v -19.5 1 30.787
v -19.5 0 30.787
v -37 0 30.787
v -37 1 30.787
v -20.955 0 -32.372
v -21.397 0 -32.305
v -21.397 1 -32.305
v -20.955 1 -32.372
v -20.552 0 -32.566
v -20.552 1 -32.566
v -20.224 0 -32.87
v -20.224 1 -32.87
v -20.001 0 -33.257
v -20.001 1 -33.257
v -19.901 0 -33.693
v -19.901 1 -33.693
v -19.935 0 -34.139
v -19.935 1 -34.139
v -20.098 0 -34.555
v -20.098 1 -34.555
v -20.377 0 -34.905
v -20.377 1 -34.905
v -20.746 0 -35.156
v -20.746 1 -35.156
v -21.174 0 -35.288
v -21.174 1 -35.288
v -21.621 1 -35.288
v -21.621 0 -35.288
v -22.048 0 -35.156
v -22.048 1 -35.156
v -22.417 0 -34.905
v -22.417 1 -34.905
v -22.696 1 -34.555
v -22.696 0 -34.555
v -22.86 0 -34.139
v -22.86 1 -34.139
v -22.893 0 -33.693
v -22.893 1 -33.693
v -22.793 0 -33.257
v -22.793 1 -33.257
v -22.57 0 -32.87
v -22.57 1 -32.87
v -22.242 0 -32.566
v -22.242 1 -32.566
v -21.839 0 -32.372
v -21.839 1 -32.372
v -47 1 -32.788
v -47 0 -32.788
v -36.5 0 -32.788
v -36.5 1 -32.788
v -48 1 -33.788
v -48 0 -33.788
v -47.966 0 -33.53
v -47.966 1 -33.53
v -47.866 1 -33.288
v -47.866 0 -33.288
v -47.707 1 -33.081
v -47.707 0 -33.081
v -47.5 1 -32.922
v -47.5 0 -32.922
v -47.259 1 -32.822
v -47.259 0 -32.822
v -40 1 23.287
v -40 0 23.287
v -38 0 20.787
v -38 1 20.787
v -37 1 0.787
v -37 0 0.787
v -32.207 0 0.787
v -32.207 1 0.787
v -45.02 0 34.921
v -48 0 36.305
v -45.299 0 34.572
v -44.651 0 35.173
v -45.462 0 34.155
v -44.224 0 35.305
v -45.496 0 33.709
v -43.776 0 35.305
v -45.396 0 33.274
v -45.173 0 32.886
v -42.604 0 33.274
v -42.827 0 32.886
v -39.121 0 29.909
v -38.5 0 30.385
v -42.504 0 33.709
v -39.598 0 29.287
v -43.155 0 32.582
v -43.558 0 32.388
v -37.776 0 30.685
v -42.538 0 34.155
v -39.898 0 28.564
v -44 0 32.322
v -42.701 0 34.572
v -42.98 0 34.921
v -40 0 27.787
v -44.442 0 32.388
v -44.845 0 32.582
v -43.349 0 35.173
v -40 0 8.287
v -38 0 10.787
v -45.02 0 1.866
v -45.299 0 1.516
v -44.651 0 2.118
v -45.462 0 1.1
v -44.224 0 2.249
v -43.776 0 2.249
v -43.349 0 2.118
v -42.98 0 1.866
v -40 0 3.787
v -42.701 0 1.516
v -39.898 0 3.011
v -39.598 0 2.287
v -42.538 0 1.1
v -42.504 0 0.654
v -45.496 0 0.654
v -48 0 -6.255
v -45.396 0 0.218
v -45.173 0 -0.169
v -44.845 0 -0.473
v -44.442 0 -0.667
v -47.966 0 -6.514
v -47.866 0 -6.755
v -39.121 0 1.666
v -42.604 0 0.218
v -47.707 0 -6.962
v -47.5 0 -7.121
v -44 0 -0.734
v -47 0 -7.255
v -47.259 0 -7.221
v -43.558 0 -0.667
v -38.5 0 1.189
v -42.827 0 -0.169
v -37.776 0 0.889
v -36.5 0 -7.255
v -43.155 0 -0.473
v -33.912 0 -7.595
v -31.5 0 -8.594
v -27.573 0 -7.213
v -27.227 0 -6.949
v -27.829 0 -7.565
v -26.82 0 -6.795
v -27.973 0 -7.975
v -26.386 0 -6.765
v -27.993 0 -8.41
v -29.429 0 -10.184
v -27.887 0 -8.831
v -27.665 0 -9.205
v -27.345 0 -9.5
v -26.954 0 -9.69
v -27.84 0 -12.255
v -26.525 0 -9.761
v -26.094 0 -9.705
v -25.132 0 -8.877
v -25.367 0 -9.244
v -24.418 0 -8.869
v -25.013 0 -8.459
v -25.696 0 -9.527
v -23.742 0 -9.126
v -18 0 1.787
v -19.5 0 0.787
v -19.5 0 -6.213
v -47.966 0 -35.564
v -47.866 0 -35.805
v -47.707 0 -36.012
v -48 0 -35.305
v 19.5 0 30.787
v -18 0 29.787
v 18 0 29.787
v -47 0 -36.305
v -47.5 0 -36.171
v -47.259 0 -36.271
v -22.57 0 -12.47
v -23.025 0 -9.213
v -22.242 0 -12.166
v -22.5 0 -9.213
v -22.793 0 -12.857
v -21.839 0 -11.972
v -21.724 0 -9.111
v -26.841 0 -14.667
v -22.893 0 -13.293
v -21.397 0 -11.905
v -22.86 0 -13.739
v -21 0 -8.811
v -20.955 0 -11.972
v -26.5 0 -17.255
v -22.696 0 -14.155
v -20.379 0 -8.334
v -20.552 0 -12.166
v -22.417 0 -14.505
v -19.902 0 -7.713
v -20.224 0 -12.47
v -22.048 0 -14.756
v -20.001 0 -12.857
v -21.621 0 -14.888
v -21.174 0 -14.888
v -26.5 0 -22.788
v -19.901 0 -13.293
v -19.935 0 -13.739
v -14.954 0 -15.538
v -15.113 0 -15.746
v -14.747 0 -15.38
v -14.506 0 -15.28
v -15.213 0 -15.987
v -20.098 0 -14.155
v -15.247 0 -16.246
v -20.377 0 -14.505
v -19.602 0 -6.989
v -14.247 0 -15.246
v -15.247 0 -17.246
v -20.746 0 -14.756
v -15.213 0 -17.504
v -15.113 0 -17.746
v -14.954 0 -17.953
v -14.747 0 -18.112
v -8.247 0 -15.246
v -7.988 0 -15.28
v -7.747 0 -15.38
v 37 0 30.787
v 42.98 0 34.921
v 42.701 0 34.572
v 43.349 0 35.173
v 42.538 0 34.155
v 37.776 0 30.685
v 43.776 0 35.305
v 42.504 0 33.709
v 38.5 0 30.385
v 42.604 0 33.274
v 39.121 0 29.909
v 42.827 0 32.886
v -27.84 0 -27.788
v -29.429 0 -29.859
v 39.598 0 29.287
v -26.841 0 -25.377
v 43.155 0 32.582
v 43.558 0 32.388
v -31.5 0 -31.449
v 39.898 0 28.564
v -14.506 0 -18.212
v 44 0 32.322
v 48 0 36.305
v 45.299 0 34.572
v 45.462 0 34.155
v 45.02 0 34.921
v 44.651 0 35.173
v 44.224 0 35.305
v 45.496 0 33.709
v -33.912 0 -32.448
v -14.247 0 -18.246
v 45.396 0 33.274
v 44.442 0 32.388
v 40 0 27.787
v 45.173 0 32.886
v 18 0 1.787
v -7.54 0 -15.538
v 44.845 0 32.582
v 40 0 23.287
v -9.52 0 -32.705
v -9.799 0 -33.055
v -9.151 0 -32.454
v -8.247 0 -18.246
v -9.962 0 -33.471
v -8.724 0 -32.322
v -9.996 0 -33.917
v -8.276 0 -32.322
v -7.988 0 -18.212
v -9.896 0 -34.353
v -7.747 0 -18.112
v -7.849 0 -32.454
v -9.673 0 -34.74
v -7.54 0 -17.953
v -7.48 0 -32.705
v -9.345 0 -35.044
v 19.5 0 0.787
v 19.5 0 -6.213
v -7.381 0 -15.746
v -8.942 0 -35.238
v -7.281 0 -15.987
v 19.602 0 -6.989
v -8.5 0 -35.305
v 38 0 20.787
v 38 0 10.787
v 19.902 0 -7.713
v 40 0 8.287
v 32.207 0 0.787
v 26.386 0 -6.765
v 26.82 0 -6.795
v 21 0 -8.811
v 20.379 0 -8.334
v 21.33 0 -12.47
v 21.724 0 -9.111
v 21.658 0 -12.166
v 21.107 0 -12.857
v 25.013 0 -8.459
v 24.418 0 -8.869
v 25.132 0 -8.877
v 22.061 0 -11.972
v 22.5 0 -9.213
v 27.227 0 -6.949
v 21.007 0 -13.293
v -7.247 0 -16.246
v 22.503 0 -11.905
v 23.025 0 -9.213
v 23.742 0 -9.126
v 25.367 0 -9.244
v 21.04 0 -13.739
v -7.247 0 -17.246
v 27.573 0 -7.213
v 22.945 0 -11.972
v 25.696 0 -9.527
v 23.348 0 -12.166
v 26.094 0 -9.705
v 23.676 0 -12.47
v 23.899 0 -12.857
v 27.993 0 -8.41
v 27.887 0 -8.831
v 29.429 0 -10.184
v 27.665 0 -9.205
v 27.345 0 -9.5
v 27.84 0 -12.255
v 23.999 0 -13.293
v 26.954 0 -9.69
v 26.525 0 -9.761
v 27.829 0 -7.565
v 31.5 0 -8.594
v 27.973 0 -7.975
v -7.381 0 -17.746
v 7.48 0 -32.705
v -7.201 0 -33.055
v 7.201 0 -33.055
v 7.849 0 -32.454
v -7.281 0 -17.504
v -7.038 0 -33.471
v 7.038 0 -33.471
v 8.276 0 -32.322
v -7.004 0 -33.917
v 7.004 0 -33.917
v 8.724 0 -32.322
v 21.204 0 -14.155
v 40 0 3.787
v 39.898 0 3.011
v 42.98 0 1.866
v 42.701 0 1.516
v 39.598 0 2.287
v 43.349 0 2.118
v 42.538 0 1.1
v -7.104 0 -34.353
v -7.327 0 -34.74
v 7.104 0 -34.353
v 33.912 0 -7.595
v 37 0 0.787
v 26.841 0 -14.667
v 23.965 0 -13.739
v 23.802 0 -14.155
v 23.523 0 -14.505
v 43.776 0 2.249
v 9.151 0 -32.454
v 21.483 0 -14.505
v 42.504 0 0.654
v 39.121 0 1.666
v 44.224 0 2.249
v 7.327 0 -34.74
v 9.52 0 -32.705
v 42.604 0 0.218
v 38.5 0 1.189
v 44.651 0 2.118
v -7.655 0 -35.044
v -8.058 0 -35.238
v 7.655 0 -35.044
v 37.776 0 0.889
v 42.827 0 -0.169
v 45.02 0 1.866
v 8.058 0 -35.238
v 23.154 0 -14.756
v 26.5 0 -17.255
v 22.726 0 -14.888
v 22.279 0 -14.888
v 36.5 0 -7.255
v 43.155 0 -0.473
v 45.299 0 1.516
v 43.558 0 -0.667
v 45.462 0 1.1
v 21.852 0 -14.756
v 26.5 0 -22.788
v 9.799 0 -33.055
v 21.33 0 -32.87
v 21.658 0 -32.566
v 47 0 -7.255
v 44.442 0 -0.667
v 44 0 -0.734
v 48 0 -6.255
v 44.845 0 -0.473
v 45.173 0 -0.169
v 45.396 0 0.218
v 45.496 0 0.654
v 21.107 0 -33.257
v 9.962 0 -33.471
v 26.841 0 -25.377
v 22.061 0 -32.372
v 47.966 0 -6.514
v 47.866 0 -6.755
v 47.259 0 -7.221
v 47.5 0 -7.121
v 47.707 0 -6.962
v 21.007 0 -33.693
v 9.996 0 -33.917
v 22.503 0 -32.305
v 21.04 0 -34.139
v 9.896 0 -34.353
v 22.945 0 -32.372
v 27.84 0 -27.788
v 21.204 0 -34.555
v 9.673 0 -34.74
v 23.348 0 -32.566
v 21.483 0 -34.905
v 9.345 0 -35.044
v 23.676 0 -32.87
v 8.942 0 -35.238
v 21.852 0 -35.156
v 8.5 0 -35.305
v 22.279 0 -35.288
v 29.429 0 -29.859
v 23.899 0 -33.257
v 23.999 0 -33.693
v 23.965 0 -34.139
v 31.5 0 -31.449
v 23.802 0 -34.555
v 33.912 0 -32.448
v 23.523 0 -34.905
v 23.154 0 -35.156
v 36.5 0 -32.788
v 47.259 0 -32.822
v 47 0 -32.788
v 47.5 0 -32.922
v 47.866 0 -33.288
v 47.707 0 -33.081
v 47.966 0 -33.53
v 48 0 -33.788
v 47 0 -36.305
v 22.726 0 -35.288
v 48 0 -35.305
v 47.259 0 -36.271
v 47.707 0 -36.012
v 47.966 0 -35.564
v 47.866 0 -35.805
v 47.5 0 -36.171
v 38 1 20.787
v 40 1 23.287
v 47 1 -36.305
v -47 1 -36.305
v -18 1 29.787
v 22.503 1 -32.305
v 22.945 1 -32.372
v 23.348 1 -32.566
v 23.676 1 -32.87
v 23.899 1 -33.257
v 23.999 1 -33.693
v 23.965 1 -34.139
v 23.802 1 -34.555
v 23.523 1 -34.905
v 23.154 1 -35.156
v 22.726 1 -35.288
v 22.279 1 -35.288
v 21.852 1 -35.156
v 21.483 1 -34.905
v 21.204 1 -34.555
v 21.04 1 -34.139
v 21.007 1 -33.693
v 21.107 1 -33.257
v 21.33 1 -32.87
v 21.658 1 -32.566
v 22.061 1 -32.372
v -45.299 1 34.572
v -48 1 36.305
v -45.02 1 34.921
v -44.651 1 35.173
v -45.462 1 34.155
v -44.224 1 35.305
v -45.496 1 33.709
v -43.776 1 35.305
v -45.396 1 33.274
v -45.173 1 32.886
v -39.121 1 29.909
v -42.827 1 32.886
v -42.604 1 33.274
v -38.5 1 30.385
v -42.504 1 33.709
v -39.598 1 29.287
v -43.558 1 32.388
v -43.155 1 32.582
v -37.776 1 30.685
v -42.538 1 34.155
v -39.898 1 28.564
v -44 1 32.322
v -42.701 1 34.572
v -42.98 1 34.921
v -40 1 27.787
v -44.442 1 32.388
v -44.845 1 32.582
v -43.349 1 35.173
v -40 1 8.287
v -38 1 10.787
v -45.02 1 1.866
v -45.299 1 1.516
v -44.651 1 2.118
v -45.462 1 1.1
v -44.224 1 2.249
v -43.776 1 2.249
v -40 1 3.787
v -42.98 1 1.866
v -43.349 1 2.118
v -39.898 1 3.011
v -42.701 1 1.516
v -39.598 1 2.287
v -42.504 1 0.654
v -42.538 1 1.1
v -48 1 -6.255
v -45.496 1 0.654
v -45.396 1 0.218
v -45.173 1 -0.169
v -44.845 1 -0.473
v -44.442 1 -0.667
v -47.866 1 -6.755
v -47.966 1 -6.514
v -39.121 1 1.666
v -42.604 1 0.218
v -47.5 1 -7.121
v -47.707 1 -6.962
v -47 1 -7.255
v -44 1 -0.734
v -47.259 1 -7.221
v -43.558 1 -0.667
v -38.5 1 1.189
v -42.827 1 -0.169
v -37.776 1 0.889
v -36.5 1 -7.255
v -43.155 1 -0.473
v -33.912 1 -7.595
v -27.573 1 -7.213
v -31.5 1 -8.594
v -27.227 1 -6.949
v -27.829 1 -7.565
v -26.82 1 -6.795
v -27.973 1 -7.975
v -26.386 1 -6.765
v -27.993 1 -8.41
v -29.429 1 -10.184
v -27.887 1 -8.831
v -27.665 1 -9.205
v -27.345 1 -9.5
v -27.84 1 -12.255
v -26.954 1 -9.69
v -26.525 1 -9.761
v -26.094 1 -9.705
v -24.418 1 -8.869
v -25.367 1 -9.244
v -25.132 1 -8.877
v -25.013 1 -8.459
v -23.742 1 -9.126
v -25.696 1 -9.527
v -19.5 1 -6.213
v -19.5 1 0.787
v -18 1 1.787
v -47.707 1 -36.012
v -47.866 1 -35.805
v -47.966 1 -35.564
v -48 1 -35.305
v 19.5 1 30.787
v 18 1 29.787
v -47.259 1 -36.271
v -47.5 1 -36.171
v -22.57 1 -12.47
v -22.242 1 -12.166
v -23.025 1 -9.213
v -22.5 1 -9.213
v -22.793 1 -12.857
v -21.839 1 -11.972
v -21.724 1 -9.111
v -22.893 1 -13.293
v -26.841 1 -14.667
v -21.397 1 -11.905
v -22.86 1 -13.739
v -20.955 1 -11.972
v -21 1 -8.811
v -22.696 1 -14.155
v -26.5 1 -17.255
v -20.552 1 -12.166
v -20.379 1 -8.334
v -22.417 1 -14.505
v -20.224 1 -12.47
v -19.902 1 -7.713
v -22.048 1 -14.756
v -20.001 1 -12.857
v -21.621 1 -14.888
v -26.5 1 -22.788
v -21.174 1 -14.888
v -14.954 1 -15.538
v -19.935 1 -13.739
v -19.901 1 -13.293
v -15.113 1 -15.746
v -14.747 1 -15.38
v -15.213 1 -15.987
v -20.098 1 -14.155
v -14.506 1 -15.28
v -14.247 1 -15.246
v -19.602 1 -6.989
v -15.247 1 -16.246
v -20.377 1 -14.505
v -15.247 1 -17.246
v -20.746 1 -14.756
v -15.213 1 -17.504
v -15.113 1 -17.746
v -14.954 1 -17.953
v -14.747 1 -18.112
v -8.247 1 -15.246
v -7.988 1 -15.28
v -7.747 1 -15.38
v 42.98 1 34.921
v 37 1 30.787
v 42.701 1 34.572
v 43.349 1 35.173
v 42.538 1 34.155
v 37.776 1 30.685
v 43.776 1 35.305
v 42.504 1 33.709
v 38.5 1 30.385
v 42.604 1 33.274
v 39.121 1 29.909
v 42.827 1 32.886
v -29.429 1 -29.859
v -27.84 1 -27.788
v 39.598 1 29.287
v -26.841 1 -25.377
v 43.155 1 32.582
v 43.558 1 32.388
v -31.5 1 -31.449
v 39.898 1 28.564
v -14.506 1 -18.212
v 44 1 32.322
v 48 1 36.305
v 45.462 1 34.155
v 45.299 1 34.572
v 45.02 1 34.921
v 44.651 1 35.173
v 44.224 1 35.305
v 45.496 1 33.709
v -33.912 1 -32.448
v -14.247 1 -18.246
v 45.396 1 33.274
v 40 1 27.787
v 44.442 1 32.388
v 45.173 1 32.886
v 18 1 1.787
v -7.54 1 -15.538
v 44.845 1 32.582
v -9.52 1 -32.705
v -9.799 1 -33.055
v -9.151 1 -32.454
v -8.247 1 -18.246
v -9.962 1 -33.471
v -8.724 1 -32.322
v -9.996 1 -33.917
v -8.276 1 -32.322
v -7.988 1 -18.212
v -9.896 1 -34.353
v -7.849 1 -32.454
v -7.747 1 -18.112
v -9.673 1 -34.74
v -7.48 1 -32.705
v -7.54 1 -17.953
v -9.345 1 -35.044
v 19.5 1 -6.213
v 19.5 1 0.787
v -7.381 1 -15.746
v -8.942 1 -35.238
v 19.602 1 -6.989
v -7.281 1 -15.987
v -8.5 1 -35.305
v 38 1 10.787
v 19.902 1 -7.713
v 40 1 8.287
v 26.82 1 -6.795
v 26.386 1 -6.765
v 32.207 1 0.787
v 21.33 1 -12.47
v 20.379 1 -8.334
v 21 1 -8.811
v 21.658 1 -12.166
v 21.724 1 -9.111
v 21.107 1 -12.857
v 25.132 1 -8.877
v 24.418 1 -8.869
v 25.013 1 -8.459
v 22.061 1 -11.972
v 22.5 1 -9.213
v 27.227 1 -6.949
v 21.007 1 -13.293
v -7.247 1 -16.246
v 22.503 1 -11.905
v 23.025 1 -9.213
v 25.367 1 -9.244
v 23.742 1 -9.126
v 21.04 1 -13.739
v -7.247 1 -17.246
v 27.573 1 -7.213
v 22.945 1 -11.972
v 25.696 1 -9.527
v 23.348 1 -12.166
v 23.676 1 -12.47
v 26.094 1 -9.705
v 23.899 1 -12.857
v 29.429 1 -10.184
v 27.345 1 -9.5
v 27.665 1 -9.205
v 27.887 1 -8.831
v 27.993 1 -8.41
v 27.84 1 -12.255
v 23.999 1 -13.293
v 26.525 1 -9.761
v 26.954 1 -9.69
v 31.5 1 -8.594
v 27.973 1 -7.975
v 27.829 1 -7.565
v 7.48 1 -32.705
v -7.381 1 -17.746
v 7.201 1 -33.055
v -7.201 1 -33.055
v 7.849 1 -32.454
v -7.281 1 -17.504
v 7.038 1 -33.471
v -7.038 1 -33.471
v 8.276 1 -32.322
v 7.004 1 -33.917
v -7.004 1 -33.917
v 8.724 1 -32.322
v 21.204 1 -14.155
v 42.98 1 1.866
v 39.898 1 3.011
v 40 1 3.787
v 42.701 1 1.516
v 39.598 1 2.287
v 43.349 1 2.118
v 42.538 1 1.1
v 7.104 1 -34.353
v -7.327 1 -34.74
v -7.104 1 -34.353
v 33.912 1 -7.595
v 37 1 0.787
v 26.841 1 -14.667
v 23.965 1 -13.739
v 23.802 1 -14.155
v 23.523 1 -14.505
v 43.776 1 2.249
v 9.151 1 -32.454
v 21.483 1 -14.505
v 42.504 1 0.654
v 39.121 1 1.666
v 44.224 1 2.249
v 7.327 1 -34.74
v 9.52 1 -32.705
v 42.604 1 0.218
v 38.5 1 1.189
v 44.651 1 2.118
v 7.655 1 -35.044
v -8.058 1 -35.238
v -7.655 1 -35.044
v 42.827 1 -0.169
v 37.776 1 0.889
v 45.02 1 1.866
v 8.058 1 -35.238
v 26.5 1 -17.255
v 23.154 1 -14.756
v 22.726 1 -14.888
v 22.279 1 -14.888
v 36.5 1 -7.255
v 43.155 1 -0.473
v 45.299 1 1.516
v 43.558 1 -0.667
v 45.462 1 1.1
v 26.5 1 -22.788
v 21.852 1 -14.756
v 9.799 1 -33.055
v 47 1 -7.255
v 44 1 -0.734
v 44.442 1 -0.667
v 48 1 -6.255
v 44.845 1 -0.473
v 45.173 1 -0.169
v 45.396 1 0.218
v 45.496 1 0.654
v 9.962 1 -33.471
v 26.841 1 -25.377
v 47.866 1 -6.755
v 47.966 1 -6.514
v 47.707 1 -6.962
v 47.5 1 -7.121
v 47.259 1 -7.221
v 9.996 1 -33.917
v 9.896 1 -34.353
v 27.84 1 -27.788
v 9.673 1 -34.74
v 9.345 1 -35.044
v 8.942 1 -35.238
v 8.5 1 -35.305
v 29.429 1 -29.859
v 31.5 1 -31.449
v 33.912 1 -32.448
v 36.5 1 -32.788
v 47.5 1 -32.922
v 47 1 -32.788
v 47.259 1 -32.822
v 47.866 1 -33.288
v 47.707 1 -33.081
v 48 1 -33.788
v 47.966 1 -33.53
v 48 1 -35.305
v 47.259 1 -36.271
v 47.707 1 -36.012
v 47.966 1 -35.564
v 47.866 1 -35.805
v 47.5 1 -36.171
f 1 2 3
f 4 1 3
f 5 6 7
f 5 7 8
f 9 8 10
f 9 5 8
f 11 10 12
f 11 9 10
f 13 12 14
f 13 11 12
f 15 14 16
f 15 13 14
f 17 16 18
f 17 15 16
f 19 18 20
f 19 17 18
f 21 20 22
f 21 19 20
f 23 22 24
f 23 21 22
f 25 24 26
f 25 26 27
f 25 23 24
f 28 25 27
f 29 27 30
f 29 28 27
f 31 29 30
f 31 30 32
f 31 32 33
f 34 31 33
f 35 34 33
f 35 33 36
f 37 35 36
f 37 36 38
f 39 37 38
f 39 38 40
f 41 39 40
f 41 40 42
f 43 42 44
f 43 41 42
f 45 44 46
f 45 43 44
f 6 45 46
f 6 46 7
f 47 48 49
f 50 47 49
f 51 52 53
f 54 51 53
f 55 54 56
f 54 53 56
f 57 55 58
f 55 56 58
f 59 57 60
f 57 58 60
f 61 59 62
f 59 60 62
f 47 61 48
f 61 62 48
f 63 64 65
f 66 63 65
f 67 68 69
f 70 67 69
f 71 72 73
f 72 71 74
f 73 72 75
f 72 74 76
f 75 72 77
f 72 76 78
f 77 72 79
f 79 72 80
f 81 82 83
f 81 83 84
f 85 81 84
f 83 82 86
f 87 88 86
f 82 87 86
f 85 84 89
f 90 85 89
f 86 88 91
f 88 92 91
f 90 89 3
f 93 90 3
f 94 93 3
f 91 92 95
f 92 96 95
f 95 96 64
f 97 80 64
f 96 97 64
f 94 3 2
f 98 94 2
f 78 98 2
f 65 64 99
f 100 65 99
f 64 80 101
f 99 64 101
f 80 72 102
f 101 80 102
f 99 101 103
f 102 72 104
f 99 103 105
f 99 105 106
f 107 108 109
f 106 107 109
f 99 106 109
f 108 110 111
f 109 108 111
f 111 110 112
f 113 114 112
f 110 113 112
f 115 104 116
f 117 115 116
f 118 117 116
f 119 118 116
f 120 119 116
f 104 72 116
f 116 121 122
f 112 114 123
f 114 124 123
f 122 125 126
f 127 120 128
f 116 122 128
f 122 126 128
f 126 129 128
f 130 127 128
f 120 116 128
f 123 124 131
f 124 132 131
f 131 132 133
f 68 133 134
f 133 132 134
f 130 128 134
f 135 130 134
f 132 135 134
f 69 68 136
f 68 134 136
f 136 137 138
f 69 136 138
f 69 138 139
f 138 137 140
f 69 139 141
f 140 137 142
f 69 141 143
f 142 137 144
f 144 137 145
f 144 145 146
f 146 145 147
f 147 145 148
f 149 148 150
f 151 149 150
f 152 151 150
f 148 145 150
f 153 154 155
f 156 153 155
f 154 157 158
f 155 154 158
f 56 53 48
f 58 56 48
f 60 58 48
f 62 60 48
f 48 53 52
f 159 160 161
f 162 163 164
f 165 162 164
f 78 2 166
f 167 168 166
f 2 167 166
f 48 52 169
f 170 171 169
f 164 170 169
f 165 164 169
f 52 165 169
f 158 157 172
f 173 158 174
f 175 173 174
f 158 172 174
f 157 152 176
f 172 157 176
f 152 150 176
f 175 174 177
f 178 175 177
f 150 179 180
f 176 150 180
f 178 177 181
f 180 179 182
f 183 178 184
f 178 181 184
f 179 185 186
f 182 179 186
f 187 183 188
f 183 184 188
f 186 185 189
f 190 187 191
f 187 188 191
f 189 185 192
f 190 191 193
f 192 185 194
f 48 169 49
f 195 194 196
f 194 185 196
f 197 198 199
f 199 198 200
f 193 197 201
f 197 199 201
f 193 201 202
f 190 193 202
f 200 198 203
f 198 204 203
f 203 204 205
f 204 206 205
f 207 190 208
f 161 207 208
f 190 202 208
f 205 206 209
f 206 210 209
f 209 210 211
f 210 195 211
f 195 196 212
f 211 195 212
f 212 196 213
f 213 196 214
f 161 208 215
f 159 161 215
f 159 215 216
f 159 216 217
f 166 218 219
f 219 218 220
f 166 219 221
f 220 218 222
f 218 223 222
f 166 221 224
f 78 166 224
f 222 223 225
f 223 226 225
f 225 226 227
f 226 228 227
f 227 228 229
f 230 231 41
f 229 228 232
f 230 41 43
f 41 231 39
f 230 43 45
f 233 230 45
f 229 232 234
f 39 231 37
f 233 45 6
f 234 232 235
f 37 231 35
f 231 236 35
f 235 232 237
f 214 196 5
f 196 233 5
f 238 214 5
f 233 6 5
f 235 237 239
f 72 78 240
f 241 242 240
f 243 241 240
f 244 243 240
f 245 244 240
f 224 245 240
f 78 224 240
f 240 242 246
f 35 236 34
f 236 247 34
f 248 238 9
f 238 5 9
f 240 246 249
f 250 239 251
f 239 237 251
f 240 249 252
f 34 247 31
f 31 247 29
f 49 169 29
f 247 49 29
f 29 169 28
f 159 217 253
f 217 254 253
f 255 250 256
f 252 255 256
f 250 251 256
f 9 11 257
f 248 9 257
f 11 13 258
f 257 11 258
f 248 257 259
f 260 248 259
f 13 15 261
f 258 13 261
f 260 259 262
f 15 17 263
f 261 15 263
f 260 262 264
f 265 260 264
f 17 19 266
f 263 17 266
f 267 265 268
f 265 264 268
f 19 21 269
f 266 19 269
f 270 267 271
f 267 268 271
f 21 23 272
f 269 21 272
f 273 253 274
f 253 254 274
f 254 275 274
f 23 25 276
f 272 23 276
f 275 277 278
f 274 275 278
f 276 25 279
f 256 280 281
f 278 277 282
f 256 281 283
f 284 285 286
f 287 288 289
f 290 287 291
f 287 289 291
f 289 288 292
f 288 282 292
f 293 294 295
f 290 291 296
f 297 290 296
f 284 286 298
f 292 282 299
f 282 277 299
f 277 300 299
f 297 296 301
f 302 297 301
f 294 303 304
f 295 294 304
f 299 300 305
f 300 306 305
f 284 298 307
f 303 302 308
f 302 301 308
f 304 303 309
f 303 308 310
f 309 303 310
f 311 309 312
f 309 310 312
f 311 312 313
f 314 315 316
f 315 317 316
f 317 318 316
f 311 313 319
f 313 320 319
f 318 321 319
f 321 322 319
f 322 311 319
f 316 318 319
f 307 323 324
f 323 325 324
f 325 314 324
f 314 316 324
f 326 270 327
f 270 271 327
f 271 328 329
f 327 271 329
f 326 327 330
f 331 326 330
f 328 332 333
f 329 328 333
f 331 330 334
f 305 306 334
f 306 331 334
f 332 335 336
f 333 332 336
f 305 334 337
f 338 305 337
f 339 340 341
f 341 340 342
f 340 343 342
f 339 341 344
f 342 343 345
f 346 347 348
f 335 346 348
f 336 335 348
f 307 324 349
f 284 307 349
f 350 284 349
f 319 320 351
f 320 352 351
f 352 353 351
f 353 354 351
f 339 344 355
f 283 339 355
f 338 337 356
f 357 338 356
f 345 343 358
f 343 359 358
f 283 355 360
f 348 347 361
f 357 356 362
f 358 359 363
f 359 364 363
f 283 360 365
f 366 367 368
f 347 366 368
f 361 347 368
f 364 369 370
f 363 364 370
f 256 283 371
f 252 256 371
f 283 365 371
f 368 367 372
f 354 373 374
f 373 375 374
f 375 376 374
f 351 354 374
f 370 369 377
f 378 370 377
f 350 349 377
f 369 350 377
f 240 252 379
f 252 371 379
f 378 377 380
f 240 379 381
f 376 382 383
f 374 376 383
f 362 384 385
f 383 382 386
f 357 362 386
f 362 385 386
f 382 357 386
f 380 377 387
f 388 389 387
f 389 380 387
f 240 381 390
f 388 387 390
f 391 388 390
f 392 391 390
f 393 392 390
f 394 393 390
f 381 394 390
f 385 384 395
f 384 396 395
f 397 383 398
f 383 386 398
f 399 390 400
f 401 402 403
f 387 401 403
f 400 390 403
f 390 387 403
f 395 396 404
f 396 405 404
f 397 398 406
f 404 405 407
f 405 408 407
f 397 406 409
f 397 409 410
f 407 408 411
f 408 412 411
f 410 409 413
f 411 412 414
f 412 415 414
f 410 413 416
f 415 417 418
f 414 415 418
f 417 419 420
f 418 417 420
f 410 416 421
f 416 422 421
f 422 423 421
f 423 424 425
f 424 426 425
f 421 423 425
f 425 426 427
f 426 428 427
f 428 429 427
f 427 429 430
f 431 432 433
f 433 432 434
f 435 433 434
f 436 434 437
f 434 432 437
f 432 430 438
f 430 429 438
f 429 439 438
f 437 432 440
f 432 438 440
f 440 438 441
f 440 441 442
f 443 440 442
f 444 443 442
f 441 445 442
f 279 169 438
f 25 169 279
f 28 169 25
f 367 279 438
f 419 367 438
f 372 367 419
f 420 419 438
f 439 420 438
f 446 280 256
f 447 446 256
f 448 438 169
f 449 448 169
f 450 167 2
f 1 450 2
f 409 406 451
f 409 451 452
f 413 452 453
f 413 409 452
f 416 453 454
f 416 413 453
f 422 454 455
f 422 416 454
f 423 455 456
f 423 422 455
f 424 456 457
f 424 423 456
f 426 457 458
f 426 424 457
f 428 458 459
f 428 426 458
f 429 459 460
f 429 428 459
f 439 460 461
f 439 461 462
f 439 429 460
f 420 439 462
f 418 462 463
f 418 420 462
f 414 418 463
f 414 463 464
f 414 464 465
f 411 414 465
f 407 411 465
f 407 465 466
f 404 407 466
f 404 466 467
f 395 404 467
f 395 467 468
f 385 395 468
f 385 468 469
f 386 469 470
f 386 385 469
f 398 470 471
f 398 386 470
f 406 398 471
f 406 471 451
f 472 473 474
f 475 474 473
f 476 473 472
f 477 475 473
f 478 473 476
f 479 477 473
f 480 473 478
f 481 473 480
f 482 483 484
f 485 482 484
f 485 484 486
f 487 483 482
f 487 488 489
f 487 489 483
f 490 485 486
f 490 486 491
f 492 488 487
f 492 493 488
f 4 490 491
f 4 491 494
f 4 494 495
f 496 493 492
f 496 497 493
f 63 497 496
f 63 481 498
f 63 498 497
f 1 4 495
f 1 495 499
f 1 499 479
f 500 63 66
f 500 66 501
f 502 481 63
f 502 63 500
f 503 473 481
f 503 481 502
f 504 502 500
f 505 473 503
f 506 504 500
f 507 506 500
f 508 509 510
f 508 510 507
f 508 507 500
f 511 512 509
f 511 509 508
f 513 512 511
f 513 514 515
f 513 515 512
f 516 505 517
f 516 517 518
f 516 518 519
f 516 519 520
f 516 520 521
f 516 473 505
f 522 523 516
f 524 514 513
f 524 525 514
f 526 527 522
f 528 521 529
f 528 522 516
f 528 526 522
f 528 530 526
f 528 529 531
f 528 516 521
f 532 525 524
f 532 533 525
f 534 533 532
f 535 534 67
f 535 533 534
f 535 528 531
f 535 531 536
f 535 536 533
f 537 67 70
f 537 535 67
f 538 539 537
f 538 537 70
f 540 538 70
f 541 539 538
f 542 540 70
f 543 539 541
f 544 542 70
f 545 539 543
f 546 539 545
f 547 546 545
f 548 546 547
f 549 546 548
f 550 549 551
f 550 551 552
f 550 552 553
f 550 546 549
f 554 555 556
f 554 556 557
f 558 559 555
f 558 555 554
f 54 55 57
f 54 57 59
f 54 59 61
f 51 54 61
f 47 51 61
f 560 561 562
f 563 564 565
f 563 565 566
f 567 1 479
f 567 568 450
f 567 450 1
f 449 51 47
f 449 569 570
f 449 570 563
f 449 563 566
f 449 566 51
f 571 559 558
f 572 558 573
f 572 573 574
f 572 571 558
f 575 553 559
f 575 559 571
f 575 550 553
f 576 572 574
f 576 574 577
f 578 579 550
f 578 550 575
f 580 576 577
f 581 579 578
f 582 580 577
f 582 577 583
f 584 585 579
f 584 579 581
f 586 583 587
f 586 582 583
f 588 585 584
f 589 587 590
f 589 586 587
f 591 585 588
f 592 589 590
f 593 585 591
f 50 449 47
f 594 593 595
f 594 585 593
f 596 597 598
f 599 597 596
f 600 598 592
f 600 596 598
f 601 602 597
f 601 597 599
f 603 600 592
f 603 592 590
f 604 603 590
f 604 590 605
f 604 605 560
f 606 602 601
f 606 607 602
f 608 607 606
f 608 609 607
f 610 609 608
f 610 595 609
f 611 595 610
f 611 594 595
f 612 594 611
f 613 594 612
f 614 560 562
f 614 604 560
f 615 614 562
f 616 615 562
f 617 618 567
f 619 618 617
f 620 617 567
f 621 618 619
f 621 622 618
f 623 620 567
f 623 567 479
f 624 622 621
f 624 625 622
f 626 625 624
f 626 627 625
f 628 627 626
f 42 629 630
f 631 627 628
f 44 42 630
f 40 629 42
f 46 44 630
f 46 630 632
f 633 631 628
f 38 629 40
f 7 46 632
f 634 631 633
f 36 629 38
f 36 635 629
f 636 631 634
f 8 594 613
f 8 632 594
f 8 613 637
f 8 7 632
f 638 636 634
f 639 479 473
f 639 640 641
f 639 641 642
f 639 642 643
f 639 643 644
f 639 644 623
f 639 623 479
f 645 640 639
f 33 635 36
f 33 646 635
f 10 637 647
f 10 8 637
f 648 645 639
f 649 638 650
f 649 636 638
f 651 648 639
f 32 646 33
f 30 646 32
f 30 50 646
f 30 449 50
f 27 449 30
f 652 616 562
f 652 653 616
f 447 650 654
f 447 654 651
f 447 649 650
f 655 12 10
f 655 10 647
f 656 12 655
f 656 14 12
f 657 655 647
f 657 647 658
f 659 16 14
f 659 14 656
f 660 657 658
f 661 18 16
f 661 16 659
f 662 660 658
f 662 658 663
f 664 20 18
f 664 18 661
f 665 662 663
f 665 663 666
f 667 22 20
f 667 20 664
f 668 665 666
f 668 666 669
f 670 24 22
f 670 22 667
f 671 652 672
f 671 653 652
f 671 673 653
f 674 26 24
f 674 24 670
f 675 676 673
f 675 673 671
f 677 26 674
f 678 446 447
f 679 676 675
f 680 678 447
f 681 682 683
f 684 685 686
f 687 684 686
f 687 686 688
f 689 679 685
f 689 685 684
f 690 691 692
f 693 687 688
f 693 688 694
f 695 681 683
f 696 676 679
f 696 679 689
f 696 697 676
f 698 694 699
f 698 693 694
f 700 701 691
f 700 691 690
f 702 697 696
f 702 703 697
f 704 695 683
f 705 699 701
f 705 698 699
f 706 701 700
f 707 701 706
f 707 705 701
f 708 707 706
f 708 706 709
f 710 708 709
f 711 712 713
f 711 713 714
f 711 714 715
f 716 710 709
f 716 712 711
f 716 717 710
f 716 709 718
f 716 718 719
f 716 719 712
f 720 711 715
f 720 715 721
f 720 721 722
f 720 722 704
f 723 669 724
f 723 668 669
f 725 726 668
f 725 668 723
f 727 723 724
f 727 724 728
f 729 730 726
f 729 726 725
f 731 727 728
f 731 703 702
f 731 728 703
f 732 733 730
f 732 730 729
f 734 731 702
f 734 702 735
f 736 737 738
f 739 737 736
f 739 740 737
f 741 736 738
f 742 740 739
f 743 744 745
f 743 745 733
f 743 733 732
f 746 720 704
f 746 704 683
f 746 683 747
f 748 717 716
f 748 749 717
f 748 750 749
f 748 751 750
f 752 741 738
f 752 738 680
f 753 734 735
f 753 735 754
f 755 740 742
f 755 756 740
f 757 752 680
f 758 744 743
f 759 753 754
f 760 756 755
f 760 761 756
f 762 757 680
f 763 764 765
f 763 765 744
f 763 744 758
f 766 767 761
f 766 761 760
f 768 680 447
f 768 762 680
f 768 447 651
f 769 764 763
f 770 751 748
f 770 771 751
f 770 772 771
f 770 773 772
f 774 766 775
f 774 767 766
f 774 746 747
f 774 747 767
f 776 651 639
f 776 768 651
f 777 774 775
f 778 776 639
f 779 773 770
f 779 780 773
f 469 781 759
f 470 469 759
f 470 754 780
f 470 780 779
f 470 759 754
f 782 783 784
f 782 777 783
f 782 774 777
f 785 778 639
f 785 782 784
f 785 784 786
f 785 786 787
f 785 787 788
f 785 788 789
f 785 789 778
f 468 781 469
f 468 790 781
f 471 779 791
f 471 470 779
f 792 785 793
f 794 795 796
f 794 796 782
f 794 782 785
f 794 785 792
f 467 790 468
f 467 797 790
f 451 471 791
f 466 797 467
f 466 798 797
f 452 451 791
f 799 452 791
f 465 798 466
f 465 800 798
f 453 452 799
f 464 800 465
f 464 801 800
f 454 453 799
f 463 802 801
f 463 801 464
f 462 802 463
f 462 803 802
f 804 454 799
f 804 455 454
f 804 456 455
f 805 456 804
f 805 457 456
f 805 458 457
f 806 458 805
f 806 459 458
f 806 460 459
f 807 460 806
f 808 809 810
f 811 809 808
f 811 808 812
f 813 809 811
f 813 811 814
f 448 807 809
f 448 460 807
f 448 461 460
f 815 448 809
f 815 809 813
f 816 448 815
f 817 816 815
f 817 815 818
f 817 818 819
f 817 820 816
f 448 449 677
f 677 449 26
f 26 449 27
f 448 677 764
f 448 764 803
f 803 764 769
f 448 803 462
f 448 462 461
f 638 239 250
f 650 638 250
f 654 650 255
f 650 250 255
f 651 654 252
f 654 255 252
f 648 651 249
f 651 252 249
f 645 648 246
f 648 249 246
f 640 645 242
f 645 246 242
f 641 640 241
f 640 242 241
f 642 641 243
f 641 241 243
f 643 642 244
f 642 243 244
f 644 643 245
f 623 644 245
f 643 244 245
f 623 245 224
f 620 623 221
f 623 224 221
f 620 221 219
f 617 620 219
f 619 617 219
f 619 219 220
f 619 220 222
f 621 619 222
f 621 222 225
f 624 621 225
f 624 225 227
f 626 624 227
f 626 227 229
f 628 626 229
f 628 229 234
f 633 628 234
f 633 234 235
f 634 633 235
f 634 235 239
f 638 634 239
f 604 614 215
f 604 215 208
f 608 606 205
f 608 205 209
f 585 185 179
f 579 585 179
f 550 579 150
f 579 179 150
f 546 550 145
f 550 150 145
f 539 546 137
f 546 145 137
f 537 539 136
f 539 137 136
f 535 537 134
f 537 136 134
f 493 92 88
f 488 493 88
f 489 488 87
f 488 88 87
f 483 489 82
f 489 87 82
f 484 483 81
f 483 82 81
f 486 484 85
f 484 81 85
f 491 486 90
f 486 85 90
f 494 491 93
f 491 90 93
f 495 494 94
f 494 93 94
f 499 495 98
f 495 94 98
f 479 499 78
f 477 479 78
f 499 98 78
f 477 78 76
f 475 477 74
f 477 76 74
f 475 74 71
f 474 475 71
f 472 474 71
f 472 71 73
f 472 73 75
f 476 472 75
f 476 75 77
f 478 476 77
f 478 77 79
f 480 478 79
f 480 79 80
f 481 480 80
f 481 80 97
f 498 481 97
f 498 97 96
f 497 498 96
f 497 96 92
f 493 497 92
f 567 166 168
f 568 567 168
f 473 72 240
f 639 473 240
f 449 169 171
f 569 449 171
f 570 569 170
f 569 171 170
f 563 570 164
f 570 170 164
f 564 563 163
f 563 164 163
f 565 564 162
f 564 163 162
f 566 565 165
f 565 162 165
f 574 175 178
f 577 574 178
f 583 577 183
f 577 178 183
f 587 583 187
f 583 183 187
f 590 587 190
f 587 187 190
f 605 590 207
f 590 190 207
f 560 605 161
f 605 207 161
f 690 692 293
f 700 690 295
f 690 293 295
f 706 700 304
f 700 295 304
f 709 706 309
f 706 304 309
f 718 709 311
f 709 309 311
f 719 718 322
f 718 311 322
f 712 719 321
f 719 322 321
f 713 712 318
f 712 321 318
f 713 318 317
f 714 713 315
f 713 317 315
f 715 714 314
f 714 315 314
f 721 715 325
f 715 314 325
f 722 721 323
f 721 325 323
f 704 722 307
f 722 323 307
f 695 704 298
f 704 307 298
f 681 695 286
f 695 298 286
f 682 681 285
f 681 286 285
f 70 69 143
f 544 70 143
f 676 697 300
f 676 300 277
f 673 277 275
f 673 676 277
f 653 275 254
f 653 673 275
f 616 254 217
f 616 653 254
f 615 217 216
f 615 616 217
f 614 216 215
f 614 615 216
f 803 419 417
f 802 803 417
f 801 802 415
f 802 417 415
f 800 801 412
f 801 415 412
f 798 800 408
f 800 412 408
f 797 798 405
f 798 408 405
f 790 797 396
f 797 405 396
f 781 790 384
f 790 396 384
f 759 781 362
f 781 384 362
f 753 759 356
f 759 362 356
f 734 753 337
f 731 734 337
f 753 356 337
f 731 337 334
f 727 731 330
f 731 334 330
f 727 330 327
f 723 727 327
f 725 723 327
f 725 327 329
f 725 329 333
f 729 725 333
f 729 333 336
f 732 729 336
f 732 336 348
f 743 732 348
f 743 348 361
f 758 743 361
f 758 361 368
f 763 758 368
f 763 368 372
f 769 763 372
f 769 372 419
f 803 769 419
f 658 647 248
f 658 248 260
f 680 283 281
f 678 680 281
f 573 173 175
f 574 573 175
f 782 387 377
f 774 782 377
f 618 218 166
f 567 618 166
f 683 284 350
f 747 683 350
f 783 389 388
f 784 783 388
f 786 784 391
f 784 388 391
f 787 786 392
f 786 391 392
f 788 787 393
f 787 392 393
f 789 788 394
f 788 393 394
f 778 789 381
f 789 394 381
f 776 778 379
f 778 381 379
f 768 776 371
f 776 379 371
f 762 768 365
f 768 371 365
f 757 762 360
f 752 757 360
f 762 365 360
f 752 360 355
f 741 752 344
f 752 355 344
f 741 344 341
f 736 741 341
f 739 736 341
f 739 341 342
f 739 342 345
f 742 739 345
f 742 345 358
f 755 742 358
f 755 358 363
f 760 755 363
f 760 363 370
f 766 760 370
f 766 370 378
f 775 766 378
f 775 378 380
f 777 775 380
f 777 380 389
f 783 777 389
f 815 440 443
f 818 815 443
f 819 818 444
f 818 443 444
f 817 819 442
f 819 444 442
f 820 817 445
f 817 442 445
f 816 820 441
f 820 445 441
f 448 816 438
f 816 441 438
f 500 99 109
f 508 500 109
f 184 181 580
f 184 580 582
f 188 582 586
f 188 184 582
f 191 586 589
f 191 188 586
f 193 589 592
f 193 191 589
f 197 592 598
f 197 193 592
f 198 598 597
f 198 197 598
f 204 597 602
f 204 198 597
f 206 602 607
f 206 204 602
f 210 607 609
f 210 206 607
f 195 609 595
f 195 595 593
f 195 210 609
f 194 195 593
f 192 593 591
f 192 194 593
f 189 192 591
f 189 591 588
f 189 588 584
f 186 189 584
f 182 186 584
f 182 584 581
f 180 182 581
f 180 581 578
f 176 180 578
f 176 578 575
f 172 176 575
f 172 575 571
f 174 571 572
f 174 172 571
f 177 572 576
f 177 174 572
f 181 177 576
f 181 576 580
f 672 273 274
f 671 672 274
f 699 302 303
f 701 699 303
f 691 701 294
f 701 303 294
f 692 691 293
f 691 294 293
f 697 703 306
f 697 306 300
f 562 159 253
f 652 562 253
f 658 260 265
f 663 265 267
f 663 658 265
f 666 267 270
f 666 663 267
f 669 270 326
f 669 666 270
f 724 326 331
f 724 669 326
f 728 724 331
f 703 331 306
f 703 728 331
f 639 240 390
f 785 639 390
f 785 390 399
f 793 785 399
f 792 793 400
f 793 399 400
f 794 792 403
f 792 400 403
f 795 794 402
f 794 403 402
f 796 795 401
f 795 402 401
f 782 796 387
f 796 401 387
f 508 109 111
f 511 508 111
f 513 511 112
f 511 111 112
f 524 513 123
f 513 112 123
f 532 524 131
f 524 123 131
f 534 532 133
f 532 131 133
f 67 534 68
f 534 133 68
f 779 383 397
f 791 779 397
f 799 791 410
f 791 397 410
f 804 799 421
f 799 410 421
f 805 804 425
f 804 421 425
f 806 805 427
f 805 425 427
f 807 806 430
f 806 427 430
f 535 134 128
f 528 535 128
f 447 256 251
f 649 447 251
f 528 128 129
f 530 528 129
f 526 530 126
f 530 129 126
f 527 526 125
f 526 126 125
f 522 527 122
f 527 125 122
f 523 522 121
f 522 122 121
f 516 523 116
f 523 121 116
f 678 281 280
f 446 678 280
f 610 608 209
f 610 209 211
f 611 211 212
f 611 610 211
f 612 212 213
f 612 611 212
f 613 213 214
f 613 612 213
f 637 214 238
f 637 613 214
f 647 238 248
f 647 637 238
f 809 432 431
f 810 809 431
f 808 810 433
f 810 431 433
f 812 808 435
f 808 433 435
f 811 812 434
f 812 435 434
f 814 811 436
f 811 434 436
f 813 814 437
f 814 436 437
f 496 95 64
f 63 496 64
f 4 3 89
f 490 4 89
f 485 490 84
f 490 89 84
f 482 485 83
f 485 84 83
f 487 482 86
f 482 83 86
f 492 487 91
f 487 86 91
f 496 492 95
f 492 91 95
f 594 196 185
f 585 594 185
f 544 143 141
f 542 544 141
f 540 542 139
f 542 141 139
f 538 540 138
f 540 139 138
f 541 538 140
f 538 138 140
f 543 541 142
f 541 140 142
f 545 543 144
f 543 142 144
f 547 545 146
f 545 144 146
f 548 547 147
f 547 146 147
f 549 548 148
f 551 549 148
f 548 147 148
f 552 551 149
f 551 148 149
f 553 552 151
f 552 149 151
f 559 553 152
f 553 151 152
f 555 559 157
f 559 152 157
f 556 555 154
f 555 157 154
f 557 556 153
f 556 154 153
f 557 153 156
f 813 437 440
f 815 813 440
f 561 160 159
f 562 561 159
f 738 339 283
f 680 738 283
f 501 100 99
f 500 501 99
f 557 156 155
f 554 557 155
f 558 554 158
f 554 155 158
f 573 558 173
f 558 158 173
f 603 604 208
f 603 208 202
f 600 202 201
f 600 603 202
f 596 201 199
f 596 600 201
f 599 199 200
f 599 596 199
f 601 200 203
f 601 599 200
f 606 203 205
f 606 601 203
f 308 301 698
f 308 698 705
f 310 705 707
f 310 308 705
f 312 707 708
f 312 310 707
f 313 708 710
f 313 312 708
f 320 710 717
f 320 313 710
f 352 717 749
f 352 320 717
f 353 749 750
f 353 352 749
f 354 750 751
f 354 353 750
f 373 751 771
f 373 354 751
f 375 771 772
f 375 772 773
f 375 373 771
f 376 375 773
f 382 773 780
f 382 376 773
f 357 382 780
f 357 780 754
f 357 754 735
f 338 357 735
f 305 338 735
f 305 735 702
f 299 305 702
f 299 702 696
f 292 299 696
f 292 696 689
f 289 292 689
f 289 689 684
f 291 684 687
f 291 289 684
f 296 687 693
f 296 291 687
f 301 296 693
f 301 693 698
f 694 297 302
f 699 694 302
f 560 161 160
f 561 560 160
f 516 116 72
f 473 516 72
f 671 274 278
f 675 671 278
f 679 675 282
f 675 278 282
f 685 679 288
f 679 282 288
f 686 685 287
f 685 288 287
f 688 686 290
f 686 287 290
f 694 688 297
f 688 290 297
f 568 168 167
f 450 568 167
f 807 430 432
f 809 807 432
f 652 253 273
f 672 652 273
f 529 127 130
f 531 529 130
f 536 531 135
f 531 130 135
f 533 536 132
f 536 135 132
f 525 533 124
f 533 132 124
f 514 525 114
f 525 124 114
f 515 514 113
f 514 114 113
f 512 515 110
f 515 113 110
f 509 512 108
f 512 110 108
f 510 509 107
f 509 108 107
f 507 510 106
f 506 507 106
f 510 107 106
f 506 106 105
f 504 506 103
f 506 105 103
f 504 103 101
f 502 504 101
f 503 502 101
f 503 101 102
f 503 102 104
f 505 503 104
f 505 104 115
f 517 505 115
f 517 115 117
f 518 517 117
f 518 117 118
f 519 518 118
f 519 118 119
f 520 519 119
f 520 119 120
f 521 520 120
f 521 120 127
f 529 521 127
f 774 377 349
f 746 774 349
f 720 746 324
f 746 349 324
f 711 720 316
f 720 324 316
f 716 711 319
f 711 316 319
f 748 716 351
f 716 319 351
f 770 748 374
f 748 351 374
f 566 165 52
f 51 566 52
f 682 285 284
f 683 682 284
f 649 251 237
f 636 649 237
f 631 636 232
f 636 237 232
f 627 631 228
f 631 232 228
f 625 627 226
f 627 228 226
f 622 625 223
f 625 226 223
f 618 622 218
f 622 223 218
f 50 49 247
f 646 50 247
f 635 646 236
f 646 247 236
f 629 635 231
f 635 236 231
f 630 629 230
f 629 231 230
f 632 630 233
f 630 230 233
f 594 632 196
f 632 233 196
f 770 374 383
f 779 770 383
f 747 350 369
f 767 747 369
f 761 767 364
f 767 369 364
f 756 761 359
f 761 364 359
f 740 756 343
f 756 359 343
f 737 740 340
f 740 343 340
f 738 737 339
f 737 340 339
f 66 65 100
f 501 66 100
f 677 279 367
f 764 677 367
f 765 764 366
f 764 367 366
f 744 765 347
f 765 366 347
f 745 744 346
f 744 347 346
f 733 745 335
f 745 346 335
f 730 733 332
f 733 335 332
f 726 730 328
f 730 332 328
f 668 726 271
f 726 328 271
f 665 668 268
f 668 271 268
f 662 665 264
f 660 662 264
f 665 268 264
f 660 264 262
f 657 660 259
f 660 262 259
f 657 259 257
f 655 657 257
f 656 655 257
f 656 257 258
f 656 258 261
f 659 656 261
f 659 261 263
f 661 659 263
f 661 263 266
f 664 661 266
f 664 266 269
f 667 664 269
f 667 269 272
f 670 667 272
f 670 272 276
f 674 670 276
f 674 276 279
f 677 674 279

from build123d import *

# Parameters (mm, degrees)
SKETCH_1_R          = 1.5
EXTRUDE_1_DEPTH     = 1
SKETCH_3_R          = 1.5
CUT_EXTRUDE_1_DEPTH = 61.191781662
SKETCH_4_R          = 1.5
CUT_EXTRUDE_2_DEPTH = 61.191781662
CUT_EXTRUDE_3_DEPTH = 61.191781662


with BuildPart() as part:
    # Эскиз1 → Бобышка-Вытянуть1 (new body)
    with BuildSketch(Plane(origin=(0, 0, 0), x_dir=(1, 0, 0), z_dir=(0, 1, 0))):
        with BuildLine():
            Line((-48, -36.304966321), (48, -36.304966321))
            Line((48, -36.304966321), (48, 6.254720986))
            ThreePointArc((48, 6.254720986), (47.707106781, 6.961827767), (47, 7.254720986))
            Line((47, 7.254720986), (36.5, 7.254720986))
            ThreePointArc((36.5, 7.254720986), (29.428932188, 10.183653174), (26.5, 17.254720986))
            Line((26.5, 17.254720986), (26.5, 22.788381883))
            ThreePointArc((26.5, 22.788381883), (29.428932188, 29.859449695), (36.5, 32.788381883))
            Line((36.5, 32.788381883), (47, 32.788381883))
            ThreePointArc((47, 32.788381883), (47.707106781, 33.081275101), (48, 33.788381883))
            Line((48, 33.788381883), (48, 35.304966322))
            ThreePointArc((48, 35.304966322), (47.707106781, 36.012073103), (47, 36.304966322))
            Line((47, 36.304966322), (-47, 36.304966322))
            ThreePointArc((-47, 36.304966322), (-47.707106781, 36.012073103), (-48, 35.304966322))
            Line((-48, 35.304966322), (-48, 33.788381883))
            ThreePointArc((-48, 33.788381883), (-47.707106781, 33.081275101), (-47, 32.788381883))
            Line((-47, 32.788381883), (-36.5, 32.788381883))
            ThreePointArc((-36.5, 32.788381883), (-29.428932188, 29.859449695), (-26.5, 22.788381883))
            Line((-26.5, 22.788381883), (-26.5, 17.254720986))
            ThreePointArc((-26.5, 17.254720986), (-29.428932188, 10.183653174), (-36.5, 7.254720986))
            Line((-36.5, 7.254720986), (-47, 7.254720986))
            ThreePointArc((-47, 7.254720986), (-47.707106781, 6.961827767), (-48, 6.254720986))
            Line((-48, 6.254720986), (-48, -36.304966321))
        make_face()
        with Locations(Location((-21.397134942, 13.404966321, 0), (0, 0, 270))):
            Circle(SKETCH_1_R, mode=Mode.SUBTRACT)
        with Locations(Location((-21.397134942, 33.804966321, 0), (0, 0, 270))):
            Circle(SKETCH_1_R, mode=Mode.SUBTRACT)
        with Locations(Location((22.502865058, 13.404966321, 0), (0, 0, 270))):
            Circle(SKETCH_1_R, mode=Mode.SUBTRACT)
        with Locations(Location((22.502865058, 33.804966321, 0), (0, 0, 270))):
            Circle(SKETCH_1_R, mode=Mode.SUBTRACT)
        with BuildLine():
            Line((-19.5, -0.787211353), (-18, -1.787211353))
            Line((-18, -1.787211353), (18, -1.787211353))
            Line((18, -1.787211353), (19.5, -0.787211353))
            Line((19.5, -0.787211353), (19.5, 6.212788647))
            ThreePointArc((19.5, 6.212788647), (20.378679656, 8.334108991), (22.5, 9.212788647))
            Line((22.5, 9.212788647), (23.024503903, 9.212788647))
            ThreePointArc((23.024503903, 9.212788647), (24.348525199, 8.904807891), (25.400697774, 8.044100386))
            Line((25.400697774, 8.044100386), (32.206912135, -0.787211353))
            Line((32.206912135, -0.787211353), (37, -0.787211353))
            ThreePointArc((37, -0.787211353), (39.121320344, -1.665891009), (40, -3.787211353))
            Line((40, -3.787211353), (40, -8.287211353))
            Line((40, -8.287211353), (38, -10.787211353))
            Line((38, -10.787211353), (38, -20.787211353))
            Line((38, -20.787211353), (40, -23.287211353))
            Line((40, -23.287211353), (40, -27.787211353))
            ThreePointArc((40, -27.787211353), (39.121320344, -29.908531696), (37, -30.787211353))
            Line((37, -30.787211353), (19.5, -30.787211353))
            Line((19.5, -30.787211353), (18, -29.787211353))
            Line((18, -29.787211353), (-18, -29.787211353))
            Line((-18, -29.787211353), (-19.5, -30.787211353))
            Line((-19.5, -30.787211353), (-37, -30.787211353))
            ThreePointArc((-37, -30.787211353), (-39.121320344, -29.908531696), (-40, -27.787211353))
            Line((-40, -27.787211353), (-40, -23.287211353))
            Line((-40, -23.287211353), (-38, -20.787211353))
            Line((-38, -20.787211353), (-38, -10.787211353))
            Line((-38, -10.787211353), (-40, -8.287211353))
            Line((-40, -8.287211353), (-40, -3.787211353))
            ThreePointArc((-40, -3.787211353), (-39.121320344, -1.665891009), (-37, -0.787211353))
            Line((-37, -0.787211353), (-32.206912135, -0.787211353))
            Line((-32.206912135, -0.787211353), (-25.400697774, 8.044100386))
            ThreePointArc((-25.400697774, 8.044100386), (-24.348525199, 8.904807891), (-23.024503903, 9.212788647))
            Line((-23.024503903, 9.212788647), (-22.5, 9.212788647))
            ThreePointArc((-22.5, 9.212788647), (-20.378679656, 8.334108991), (-19.5, 6.212788647))
            Line((-19.5, 6.212788647), (-19.5, -0.787211353))
        make_face(mode=Mode.SUBTRACT)
    extrude(amount=EXTRUDE_1_DEPTH)

    # Эскиз3 → Вырез-Вытянуть1 (cut, through all)
    with BuildSketch(Plane.XZ):
        with Locations(Location((44, 33.82155076, 0), (0, 0, 270))):
            Circle(SKETCH_3_R)
        with Locations(Location((44, 0.766245183, 0), (0, 0, 270))):
            Circle(SKETCH_3_R)
        with Locations(Location((-44, 0.766245183, 0), (0, 0, 270))):
            Circle(SKETCH_3_R)
        with Locations(Location((-44, 33.82155076, 0), (0, 0, 270))):
            Circle(SKETCH_3_R)
    extrude(amount=-CUT_EXTRUDE_1_DEPTH, mode=Mode.SUBTRACT)

    # Эскиз4 → Вырез-Вытянуть2 (cut, through all)
    with BuildSketch(Plane.XZ):
        with Locations((-26.5, -8.260832856)):
            Circle(SKETCH_4_R)
        with Locations(Location((-8.5, -33.804966322, 0), (0, 0, 270))):
            Circle(SKETCH_4_R)
        with Locations(Location((8.5, -33.804966322, 0), (0, 0, 270))):
            Circle(SKETCH_4_R)
        with Locations((26.5, -8.260832856)):
            Circle(SKETCH_4_R)
    extrude(amount=-CUT_EXTRUDE_2_DEPTH, mode=Mode.SUBTRACT)

    # Эскиз6 → Вырез-Вытянуть3 (cut, through all)
    with BuildSketch(Plane(origin=(0, 1, 0), x_dir=(1, 0, 0), z_dir=(0, 1, 0))):
        with BuildLine():
            Line((-14.247312093, 18.245581007), (-8.247312093, 18.245581007))
            ThreePointArc((-8.247312093, 18.245581007), (-7.540205311, 17.952687789), (-7.247312093, 17.245581007))
            Line((-7.247312093, 17.245581007), (-7.247312093, 16.245581007))
            ThreePointArc((-7.247312093, 16.245581007), (-7.540205311, 15.538474226), (-8.247312093, 15.245581007))
            Line((-8.247312093, 15.245581007), (-14.247312093, 15.245581007))
            ThreePointArc((-14.247312093, 15.245581007), (-14.954418874, 15.538474226), (-15.247312093, 16.245581007))
            Line((-15.247312093, 16.245581007), (-15.247312093, 17.245581007))
            ThreePointArc((-15.247312093, 17.245581007), (-14.954418874, 17.952687789), (-14.247312093, 18.245581007))
        make_face()
    extrude(amount=-CUT_EXTRUDE_3_DEPTH, mode=Mode.SUBTRACT)


solid = part.part
